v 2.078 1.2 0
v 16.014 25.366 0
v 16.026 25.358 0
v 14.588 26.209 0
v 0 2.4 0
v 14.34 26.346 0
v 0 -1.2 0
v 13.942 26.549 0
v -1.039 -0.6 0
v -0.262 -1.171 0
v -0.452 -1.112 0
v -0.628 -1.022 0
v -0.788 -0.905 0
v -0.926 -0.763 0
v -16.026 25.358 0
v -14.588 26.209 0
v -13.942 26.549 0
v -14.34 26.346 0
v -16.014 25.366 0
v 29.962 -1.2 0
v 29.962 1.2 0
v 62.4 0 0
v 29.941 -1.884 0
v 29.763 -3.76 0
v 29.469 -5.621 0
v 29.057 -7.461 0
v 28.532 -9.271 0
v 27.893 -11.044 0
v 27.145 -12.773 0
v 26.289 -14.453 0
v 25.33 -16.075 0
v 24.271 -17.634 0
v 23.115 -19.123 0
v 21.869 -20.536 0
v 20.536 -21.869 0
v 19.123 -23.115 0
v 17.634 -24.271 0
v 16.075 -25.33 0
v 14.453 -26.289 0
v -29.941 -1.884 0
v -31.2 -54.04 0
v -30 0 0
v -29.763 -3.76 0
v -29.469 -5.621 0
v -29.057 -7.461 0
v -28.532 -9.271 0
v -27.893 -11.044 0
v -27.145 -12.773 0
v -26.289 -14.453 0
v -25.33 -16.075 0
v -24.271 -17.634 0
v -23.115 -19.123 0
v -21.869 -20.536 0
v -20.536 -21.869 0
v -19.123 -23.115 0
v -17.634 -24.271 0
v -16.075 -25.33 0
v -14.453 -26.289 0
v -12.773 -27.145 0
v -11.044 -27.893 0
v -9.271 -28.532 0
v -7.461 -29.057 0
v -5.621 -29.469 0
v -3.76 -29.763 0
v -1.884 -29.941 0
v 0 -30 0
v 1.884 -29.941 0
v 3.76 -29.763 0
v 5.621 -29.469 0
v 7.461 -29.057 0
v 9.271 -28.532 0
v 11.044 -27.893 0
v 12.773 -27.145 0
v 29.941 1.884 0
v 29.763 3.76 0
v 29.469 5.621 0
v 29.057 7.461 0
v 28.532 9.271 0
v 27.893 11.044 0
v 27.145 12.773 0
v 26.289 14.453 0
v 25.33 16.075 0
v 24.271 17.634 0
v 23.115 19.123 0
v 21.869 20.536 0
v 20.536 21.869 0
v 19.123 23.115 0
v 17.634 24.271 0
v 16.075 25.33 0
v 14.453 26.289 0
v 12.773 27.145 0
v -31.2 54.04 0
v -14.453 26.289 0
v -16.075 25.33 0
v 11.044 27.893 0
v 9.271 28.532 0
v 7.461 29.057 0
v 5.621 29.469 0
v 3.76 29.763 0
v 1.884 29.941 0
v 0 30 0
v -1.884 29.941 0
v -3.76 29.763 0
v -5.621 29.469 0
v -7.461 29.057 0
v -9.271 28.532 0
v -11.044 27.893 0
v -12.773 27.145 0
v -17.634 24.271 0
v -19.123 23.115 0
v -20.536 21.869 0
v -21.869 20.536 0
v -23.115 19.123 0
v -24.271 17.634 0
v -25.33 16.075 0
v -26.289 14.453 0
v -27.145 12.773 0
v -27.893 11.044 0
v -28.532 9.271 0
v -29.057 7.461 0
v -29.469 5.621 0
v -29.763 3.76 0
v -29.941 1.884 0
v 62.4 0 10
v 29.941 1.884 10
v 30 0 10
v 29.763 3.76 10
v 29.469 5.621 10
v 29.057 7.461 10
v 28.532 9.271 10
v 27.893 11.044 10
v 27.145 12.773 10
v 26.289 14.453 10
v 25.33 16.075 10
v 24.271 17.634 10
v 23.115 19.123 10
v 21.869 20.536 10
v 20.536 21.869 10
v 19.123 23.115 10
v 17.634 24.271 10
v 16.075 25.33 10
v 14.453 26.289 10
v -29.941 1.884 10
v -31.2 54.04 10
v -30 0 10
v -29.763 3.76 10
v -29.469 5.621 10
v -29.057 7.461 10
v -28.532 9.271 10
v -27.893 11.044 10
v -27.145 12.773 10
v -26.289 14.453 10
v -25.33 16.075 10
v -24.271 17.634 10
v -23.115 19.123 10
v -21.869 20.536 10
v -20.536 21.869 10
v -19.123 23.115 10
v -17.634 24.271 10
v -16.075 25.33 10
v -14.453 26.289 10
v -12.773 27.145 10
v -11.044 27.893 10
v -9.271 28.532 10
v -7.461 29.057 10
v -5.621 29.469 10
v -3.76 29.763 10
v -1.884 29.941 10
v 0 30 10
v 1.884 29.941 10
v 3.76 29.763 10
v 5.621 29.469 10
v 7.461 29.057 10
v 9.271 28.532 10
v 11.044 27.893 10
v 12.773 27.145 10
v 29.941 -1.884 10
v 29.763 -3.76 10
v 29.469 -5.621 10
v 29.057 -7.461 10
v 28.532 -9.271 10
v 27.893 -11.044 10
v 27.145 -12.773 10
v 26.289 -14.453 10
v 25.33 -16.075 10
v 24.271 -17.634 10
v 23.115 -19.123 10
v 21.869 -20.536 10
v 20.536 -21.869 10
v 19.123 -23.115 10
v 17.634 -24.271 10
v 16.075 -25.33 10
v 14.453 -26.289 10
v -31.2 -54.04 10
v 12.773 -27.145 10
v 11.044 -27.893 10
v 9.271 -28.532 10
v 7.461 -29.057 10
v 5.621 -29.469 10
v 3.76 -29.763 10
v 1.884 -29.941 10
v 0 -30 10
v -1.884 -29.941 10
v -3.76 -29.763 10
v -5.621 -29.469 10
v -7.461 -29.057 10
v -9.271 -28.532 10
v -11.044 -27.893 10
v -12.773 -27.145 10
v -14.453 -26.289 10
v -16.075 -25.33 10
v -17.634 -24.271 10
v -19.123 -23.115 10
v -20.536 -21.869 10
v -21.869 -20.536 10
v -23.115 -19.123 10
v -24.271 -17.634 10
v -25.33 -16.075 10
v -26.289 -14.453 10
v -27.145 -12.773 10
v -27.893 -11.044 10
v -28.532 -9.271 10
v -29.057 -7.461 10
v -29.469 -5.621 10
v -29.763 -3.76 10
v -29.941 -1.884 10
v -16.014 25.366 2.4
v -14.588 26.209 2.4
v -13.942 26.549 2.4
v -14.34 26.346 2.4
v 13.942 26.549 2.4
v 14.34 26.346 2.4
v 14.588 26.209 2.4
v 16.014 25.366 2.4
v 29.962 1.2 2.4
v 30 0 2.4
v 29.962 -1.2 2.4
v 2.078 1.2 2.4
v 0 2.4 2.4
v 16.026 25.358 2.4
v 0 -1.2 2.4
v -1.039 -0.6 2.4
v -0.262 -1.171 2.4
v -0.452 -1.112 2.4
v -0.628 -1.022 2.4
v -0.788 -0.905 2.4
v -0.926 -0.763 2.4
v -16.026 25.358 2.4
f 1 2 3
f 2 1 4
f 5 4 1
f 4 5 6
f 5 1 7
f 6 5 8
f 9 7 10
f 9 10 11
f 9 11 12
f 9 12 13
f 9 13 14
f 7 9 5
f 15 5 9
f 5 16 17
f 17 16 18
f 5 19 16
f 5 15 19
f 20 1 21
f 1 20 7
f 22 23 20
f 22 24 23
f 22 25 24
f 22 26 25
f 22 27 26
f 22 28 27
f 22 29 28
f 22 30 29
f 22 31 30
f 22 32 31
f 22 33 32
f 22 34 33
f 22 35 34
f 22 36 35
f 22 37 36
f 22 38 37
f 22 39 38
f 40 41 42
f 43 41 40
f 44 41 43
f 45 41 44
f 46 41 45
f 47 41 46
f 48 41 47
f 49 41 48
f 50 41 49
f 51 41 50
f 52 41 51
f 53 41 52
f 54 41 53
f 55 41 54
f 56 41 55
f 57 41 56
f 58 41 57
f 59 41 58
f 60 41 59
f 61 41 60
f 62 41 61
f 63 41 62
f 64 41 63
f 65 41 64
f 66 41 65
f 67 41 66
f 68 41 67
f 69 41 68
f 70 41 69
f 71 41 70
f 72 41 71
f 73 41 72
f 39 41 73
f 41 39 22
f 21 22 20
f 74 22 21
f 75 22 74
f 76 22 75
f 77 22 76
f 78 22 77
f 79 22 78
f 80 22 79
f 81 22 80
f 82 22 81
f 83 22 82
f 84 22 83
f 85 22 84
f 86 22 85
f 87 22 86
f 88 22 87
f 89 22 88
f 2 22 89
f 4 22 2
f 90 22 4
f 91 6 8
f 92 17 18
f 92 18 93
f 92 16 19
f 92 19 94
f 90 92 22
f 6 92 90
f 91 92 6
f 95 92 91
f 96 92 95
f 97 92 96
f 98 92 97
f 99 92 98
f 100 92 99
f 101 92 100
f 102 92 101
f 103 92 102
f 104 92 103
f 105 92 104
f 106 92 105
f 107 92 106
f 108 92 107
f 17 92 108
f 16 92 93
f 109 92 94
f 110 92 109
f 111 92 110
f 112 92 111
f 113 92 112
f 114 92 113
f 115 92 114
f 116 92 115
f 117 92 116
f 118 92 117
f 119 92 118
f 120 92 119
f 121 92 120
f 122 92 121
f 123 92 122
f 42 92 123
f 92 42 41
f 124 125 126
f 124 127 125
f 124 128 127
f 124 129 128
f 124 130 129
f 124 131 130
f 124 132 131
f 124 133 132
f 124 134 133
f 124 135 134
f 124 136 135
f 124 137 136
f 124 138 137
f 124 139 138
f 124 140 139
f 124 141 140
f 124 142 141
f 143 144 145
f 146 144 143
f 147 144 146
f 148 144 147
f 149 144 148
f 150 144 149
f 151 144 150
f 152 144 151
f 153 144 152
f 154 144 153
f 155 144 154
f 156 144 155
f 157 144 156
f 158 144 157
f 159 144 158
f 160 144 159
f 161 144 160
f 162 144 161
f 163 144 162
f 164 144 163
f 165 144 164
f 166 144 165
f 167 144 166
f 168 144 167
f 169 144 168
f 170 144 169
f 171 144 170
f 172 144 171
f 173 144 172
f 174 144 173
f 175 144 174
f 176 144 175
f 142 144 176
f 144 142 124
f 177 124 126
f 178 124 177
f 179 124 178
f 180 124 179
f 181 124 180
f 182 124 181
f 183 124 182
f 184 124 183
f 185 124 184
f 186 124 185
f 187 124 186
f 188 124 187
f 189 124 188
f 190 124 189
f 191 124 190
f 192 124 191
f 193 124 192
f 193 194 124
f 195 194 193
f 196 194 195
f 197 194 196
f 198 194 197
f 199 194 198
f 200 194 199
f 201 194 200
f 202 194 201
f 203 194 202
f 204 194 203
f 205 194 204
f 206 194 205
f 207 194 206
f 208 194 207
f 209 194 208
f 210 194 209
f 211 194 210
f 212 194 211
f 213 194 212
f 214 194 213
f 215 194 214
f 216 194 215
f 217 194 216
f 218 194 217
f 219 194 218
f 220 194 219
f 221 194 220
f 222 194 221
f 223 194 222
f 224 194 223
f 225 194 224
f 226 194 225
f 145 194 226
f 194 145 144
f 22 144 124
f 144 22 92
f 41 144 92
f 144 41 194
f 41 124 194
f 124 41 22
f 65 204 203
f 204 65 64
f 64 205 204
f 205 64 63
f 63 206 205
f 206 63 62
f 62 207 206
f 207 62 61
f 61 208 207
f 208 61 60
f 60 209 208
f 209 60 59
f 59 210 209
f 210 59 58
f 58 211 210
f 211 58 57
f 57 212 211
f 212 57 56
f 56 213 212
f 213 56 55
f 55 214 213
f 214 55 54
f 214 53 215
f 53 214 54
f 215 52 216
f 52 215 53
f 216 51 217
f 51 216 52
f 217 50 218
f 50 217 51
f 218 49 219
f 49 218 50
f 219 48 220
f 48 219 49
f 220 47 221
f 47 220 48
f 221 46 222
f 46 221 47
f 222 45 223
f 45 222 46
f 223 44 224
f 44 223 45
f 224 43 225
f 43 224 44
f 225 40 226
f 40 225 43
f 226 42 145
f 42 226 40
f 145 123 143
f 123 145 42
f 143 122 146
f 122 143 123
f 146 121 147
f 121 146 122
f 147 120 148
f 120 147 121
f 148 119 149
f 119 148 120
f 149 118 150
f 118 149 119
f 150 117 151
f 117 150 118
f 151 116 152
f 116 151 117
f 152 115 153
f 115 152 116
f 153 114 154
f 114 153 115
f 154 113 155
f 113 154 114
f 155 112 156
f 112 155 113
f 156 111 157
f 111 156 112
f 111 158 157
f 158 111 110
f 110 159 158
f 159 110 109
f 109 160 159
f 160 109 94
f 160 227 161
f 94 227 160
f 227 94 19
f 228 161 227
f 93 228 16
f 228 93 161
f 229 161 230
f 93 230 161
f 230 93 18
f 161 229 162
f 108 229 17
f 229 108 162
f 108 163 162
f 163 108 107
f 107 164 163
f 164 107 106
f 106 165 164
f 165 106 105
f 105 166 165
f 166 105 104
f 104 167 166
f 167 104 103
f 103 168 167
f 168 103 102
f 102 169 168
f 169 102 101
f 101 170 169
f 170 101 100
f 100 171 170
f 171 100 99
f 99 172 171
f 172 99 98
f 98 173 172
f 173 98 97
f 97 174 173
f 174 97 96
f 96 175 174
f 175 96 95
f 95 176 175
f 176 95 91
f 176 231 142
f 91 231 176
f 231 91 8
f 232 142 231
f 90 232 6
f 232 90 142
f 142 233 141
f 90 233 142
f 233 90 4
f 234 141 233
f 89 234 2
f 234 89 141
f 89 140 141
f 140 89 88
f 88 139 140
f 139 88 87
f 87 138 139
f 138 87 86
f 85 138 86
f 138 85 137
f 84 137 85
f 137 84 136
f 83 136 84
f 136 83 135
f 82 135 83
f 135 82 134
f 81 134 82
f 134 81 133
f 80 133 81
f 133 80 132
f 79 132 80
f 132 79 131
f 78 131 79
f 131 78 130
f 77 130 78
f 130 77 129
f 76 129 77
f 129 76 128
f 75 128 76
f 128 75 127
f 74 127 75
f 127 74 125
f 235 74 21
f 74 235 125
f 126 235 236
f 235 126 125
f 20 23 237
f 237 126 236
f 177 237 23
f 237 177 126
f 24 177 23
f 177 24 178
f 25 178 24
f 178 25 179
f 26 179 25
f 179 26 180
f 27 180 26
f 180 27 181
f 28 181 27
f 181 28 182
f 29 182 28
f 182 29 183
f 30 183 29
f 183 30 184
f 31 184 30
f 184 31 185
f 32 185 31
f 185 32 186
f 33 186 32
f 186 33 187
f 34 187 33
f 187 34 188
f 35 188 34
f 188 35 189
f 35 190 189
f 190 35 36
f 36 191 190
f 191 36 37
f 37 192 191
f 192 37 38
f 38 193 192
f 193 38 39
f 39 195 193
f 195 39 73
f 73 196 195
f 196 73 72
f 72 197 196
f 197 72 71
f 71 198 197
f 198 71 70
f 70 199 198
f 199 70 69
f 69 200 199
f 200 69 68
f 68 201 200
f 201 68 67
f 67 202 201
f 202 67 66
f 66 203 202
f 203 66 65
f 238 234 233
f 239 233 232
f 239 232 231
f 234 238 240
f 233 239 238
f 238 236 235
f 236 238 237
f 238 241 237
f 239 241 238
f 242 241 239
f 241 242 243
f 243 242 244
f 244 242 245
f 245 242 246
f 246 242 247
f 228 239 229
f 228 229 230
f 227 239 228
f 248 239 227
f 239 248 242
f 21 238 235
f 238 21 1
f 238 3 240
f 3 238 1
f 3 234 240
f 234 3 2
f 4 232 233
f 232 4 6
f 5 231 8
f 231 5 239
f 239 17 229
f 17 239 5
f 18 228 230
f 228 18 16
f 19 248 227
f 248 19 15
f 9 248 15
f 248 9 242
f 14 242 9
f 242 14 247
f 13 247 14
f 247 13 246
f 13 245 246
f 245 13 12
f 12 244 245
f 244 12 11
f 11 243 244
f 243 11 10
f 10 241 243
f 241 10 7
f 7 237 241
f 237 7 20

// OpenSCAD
// file circumscribed.scad
// Prints out a circle and its circumscribed specified polygon
// (c) 2020 Rich Cameron, CC-BY
// measurements in mm

wall_thickness = 1.2;
radius = 30;
n = 3; //number of sides of circumscribed polygon
height = 10;

$fs = .2;
$fa = 2;

if(height) {
	linear_extrude(height) outside();
	linear_extrude(wall_thickness * 2) inside();
} else {
	outside();
	inside();
}

module outside() difference(){
	circle(r = (radius + wall_thickness) / cos(180 / n), $fn = n);
	circle(r = radius, $fn = 100);
};

module inside()  intersection() {
	circle(radius);
	union() {
		rotate(180 / n) translate([0, -wall_thickness, 0]) square([radius, 2 *wall_thickness]);
		difference() {
			offset(wall_thickness) intersection_for(a = [0, 180 + 360 / n]) rotate(a) translate([-radius * 2, 0, 0]) square(radius * 4);
			offset(-wall_thickness) intersection_for(a = [0, 180 + 360 / n]) rotate(a) translate([-radius * 2, 0, 0]) square(radius * 4);
		}
	}
}
